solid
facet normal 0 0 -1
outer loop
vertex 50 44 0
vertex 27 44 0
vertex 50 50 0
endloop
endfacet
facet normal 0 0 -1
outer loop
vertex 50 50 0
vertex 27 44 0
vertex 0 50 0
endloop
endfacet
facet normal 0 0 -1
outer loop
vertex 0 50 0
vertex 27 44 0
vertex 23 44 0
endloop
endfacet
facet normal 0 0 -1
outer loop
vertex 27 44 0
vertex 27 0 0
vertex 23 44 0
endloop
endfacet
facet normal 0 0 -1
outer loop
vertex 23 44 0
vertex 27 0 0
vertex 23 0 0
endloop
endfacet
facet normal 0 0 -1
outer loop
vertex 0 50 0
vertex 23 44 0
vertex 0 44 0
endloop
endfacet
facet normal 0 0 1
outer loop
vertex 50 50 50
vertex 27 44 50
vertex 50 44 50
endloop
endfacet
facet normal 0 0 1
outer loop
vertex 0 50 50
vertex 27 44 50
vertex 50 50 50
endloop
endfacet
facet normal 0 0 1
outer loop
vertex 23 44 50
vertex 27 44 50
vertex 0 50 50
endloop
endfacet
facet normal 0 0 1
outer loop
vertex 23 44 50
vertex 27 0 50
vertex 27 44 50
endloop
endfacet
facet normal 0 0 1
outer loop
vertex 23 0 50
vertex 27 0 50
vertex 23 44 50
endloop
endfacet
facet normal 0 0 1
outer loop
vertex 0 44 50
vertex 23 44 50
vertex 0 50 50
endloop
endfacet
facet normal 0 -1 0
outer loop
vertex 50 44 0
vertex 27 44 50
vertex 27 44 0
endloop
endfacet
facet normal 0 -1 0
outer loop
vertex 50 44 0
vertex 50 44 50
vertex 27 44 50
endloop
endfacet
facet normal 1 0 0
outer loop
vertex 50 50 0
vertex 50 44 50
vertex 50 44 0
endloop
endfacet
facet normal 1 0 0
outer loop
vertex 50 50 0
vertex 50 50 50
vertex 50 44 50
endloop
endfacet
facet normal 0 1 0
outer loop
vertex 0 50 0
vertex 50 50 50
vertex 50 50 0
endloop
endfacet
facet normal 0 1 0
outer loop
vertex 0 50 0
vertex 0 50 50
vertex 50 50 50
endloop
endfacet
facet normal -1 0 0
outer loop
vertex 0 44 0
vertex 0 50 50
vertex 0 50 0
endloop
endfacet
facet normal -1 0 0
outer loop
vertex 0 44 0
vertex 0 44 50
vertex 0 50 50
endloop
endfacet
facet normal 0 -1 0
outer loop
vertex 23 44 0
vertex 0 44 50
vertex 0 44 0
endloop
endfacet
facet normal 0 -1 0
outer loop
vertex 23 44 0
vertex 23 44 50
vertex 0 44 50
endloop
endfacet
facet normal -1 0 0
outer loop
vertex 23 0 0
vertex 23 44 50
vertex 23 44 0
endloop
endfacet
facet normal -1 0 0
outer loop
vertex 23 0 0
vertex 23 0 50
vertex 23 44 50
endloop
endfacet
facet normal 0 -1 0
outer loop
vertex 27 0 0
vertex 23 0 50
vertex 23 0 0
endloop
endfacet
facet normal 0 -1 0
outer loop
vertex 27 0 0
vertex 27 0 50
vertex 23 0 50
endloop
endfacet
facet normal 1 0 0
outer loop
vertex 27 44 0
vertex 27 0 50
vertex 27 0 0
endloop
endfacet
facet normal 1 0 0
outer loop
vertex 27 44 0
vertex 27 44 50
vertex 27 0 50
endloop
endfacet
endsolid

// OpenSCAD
$fn = 32;

// ----------------------------------------------------------------------
// Structural section: tee 50 x 50 mm
// ----------------------------------------------------------------------

// --- parameters (mm) ---
sec_w = 50;               // tee width, X
sec_h = 50;               // tee height, Y
flange_t = 6;             // top flange thickness
web_t = 4;                // web thickness
plate_t = 50;             // cut length, Z (extrusion height)

profile = [[23, 0], [27, 0], [27, 44], [50, 44], [50, 50], [0, 50], [0, 44], [23, 44]];  // primary outline, 8 points, counter clockwise

// --- the one profile operation ---
linear_extrude(height = plate_t) polygon(points = profile);
